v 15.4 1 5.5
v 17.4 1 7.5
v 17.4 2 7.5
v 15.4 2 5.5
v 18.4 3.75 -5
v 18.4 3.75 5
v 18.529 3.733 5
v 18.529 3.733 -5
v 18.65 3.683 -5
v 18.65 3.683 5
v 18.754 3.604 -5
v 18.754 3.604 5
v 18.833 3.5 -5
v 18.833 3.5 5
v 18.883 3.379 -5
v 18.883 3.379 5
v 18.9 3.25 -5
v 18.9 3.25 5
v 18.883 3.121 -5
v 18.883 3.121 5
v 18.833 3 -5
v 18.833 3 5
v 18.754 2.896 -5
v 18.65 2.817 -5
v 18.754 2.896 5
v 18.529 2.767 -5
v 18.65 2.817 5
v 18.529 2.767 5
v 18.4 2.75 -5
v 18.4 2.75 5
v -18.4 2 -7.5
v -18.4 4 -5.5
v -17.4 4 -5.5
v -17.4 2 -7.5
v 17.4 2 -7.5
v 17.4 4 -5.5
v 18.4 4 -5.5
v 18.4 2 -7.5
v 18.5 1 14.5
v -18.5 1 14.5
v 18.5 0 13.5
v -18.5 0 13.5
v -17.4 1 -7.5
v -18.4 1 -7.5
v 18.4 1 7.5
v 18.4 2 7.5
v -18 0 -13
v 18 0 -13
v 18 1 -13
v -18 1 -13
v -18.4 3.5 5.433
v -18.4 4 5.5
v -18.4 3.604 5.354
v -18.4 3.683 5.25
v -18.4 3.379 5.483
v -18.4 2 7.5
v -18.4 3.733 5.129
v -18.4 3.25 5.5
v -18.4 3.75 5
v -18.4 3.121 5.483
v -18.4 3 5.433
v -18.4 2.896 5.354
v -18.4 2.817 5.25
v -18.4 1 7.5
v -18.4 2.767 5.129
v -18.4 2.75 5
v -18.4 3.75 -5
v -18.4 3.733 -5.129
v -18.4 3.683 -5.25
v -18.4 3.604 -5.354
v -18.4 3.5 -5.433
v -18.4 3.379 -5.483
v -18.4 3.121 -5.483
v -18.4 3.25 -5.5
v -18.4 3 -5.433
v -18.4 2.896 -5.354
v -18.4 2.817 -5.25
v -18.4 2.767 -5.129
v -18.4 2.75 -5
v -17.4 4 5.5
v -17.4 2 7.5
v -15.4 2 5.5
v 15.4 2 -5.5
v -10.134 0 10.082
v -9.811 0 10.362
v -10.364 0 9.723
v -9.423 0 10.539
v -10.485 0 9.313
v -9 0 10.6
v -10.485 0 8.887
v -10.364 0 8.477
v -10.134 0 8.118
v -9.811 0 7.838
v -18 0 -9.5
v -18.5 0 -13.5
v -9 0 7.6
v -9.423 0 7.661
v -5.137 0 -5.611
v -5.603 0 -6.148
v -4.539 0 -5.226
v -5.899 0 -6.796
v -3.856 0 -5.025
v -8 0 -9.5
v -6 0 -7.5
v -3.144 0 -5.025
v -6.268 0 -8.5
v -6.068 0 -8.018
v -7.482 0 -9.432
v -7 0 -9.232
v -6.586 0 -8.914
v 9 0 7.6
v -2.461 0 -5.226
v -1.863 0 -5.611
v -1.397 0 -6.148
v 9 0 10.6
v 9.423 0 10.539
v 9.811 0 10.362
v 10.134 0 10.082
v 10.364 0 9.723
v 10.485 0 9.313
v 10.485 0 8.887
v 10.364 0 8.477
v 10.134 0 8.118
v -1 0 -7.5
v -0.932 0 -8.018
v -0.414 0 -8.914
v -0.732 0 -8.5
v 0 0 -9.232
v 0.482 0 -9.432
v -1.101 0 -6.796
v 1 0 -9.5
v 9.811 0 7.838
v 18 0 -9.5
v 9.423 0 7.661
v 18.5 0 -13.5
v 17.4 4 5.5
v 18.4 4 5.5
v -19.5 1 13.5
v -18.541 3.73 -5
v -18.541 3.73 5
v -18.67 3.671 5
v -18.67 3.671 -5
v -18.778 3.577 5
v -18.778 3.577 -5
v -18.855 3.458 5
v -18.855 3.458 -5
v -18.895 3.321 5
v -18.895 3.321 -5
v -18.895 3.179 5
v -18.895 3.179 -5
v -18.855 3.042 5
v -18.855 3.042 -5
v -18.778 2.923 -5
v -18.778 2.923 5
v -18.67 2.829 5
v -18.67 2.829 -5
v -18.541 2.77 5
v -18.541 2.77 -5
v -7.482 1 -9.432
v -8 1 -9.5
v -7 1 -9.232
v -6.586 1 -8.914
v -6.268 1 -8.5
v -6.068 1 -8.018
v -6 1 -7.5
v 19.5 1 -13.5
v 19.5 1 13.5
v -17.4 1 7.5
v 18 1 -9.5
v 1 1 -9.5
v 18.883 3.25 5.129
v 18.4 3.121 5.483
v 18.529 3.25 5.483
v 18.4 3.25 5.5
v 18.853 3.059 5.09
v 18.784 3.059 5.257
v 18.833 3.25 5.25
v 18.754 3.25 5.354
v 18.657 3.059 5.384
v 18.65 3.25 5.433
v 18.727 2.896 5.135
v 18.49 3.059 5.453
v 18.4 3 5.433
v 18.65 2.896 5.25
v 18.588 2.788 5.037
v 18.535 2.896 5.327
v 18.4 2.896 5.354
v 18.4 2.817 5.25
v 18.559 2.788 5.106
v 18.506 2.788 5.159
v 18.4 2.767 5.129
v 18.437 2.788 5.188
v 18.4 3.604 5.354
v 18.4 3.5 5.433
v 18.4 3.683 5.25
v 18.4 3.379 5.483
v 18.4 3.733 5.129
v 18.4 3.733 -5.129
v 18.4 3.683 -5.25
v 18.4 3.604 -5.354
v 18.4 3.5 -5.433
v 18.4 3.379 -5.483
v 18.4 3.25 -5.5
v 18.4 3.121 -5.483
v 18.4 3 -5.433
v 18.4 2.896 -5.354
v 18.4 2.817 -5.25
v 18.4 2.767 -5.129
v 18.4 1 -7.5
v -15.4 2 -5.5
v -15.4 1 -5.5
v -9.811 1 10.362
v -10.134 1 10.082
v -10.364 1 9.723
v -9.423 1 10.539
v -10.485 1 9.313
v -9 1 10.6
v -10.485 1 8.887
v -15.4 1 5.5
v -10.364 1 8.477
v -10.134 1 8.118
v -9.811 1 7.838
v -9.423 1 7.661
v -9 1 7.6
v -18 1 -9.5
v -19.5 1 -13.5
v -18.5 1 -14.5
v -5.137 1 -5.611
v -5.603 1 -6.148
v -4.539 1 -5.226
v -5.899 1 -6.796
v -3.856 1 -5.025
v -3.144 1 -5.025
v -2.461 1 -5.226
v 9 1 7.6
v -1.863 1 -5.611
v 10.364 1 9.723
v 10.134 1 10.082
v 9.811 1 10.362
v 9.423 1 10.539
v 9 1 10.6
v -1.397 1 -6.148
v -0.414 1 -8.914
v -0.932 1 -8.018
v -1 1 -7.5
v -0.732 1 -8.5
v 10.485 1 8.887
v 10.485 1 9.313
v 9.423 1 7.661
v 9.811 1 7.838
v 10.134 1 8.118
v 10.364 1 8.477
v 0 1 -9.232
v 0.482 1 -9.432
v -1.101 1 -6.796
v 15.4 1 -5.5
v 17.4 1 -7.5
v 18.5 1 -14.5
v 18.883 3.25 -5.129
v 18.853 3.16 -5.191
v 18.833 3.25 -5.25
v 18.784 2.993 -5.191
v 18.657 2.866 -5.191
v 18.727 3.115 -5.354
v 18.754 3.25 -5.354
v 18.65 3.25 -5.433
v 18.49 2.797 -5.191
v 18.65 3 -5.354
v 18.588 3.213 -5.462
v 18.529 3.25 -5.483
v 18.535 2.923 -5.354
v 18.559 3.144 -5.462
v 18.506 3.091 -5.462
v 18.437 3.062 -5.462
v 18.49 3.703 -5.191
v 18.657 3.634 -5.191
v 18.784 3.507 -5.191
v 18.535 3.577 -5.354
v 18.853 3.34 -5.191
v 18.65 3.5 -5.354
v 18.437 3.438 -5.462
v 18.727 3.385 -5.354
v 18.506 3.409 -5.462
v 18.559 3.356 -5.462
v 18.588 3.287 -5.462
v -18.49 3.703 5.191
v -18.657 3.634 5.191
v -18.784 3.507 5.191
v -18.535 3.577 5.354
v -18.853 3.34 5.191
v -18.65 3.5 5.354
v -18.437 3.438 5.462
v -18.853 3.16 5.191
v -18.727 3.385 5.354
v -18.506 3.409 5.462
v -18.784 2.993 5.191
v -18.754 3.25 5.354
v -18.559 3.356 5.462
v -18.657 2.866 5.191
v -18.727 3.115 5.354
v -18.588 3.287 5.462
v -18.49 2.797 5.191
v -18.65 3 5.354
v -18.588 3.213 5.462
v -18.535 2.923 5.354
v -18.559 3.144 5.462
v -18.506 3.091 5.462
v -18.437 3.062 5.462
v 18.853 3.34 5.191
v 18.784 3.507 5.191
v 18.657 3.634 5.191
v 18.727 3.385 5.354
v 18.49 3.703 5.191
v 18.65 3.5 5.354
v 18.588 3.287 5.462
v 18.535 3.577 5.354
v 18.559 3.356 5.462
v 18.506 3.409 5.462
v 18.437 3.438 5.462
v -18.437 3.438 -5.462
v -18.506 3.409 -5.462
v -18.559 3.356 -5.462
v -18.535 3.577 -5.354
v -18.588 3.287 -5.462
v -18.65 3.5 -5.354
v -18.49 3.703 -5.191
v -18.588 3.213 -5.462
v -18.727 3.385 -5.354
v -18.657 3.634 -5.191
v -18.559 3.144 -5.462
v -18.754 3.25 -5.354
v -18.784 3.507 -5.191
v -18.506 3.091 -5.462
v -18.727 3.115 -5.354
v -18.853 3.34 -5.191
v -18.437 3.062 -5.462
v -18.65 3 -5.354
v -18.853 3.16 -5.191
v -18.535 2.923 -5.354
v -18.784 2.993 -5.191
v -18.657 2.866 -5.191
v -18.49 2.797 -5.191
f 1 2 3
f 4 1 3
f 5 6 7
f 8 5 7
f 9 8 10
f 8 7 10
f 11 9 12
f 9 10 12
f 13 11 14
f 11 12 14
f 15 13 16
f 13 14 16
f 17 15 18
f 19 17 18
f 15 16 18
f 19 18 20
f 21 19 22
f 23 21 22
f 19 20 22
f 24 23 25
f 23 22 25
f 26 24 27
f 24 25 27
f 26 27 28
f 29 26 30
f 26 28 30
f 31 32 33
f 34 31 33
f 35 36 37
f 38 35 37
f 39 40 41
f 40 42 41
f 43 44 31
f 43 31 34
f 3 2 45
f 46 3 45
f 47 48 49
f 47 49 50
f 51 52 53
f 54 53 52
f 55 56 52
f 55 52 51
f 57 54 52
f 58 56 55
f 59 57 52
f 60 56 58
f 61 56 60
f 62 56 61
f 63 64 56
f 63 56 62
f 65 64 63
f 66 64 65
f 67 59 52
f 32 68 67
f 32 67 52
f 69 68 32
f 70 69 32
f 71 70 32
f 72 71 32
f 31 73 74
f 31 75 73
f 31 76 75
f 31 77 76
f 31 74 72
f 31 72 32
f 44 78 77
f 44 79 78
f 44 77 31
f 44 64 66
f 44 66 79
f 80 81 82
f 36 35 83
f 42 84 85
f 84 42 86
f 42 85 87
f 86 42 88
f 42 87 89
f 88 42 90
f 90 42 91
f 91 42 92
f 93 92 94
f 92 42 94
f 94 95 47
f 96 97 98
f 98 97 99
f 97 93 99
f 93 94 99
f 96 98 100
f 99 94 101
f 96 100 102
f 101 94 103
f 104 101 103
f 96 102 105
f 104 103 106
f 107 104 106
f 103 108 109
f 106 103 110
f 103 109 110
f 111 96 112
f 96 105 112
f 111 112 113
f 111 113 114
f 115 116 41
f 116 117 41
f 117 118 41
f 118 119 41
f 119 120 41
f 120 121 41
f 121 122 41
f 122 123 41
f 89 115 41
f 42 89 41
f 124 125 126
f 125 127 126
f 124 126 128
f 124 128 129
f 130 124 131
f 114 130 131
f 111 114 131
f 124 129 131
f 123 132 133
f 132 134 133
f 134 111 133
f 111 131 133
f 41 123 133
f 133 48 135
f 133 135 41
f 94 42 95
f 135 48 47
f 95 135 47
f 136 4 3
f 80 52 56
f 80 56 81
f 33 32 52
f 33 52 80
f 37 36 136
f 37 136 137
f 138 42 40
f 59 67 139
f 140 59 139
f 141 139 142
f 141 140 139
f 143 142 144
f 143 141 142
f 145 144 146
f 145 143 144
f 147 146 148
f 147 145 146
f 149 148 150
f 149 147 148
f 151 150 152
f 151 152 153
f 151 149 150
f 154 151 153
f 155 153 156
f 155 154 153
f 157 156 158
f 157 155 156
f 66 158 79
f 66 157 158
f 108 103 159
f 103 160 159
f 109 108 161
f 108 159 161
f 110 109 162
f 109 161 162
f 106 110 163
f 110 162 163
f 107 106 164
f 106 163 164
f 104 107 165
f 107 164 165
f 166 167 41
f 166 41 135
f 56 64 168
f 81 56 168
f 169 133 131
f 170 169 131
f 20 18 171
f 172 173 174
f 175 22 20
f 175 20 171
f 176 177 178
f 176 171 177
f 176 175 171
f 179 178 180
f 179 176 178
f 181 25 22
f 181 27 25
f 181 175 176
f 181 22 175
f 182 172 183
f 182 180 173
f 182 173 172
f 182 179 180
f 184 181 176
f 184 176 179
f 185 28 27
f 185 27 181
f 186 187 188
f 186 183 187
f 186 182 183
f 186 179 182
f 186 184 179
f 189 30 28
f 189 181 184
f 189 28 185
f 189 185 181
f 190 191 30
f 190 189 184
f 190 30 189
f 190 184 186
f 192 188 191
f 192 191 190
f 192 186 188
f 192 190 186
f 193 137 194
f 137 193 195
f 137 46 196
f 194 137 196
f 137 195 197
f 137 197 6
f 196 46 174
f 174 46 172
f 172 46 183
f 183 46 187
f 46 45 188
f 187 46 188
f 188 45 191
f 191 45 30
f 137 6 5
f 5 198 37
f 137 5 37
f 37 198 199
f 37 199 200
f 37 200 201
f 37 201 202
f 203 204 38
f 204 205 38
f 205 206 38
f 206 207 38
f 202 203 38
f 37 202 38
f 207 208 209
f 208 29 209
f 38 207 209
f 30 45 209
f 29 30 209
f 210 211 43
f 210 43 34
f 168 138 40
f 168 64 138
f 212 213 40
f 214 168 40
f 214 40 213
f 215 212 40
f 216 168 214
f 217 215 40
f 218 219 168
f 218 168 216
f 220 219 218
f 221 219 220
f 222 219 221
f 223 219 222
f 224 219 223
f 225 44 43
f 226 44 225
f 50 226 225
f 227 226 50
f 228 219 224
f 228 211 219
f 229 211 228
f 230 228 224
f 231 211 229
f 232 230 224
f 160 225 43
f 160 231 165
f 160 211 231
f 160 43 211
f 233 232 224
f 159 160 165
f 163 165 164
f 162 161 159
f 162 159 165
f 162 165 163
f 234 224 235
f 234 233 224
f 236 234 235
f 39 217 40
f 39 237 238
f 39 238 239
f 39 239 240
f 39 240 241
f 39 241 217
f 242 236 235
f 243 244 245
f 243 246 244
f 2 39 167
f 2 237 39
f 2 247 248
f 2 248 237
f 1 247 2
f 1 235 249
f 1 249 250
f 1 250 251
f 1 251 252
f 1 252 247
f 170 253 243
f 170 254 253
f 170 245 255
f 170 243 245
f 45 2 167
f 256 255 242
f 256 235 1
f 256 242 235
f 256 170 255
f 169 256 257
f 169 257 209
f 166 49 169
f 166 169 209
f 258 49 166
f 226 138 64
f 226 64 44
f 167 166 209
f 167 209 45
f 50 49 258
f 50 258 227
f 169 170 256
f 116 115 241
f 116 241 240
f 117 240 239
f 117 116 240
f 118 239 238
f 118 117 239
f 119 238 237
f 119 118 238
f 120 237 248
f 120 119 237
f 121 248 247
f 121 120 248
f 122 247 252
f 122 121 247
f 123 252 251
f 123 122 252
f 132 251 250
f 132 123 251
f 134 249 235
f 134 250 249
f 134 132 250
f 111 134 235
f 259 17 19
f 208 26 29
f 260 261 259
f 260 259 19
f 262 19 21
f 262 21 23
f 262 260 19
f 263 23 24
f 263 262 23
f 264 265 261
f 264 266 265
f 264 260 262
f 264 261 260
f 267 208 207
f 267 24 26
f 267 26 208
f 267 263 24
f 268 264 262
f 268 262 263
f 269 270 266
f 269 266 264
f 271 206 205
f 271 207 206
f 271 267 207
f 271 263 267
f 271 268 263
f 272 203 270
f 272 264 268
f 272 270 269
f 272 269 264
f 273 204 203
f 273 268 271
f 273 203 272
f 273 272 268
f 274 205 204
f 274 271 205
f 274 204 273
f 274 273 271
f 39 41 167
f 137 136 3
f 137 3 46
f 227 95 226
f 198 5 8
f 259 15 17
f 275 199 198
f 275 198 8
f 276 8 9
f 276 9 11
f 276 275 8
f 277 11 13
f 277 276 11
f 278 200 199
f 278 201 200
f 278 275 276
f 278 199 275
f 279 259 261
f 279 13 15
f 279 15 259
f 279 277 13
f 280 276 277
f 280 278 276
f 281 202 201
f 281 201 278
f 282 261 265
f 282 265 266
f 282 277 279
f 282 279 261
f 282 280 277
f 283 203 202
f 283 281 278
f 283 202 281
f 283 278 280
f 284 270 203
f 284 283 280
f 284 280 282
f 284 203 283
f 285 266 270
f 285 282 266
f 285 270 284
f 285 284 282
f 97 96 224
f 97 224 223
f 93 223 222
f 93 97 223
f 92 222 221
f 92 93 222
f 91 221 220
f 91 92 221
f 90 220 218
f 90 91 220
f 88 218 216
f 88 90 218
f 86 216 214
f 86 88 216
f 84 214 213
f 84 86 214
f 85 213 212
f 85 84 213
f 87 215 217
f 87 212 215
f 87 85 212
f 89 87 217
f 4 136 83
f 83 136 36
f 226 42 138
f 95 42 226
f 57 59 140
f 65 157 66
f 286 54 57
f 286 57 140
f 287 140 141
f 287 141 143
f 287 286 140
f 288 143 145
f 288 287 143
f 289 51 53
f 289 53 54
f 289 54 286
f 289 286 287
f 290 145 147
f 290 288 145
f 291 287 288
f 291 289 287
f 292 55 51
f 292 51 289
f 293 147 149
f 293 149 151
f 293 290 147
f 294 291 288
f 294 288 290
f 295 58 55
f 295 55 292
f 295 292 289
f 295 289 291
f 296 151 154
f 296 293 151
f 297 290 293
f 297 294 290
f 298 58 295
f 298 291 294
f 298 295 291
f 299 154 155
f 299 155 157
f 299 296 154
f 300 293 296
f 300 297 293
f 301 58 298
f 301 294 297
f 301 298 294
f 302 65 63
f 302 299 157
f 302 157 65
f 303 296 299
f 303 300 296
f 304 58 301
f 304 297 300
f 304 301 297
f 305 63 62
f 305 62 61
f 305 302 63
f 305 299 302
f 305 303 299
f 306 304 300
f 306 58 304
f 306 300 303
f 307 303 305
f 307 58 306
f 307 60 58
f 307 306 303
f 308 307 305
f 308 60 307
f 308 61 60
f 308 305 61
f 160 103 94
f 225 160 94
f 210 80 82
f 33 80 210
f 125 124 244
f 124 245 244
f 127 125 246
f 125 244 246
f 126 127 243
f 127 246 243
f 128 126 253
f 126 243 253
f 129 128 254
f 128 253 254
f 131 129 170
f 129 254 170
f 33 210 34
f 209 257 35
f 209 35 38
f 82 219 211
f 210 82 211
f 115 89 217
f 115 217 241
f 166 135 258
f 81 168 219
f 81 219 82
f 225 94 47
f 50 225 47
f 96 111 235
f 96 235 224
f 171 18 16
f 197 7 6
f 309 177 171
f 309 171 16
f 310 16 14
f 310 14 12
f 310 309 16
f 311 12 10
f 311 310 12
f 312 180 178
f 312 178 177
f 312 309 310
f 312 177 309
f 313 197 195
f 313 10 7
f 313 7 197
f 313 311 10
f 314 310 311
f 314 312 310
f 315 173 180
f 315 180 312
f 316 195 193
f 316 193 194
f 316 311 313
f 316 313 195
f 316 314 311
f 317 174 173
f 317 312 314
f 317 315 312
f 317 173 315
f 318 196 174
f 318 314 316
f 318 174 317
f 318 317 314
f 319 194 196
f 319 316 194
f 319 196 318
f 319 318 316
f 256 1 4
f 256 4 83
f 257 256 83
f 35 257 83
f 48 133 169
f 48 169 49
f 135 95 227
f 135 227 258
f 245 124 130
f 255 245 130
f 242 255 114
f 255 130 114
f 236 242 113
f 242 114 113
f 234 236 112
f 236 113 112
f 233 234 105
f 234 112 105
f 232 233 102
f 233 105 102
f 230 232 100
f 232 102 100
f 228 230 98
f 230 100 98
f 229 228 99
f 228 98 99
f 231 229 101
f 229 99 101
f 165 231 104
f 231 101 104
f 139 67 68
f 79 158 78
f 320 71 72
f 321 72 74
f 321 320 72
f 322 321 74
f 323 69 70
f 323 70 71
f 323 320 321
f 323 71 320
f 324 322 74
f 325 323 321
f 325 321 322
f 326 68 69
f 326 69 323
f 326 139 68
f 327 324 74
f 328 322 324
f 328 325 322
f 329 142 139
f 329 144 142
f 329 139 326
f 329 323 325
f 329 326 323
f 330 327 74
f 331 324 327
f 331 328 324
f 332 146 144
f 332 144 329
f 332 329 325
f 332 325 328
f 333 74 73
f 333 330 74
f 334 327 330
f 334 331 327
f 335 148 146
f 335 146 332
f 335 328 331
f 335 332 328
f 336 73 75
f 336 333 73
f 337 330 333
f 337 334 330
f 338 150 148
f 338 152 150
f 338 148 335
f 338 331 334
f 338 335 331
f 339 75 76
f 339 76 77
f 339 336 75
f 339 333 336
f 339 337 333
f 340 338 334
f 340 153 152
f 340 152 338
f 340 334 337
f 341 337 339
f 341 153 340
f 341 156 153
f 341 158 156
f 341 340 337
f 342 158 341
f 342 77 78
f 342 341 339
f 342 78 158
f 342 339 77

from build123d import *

# Parameters (mm, degrees)
SKETCH1_W           = 39
SKETCH1_H           = 29
BOSS_EXTRUDE1_DEPTH = 1
SKETCH2_W           = 3
SKETCH2_H           = 15
BOSS_EXTRUDE2_DEPTH = 3
CHAMFER1_SIZE       = 1
CHAMFER2_SIZE       = 2
SKETCH3_W           = 11
SKETCH3_H           = 1
BOSS_EXTRUDE3_DEPTH = 0.5
FILLET1_R           = 0.5
CUT_EXTRUDE1_REACH  = 26.627
CUT_EXTRUDE2_REACH  = 26.627
SKETCH5_W           = 36
SKETCH5_H           = 3.5
CUT_EXTRUDE3_REACH  = 26.627
FILLET2_R           = 2


# Read off the part's stored shape, not the designer's step: Mirror1
# Some blends are built 0.0001 mm under size
with BuildPart() as part:
    # Sketch1 → Boss-Extrude1 (new body)
    with BuildSketch(Plane(origin=(0, 0, 0), x_dir=(1, 0, 0), z_dir=(0, 1, 0))):
        Rectangle(SKETCH1_W, SKETCH1_H)
    extrude(amount=BOSS_EXTRUDE1_DEPTH)

    # Sketch2 → Boss-Extrude2 (add)
    with BuildSketch(Plane(origin=(0, 1, 0), x_dir=(1, 0, 0), z_dir=(0, 1, 0))):
        with Locations((-16.9, 0)):
            Rectangle(SKETCH2_W, SKETCH2_H)
        with Locations((16.9, 0)):
            Rectangle(SKETCH2_W, SKETCH2_H)
    extrude(amount=BOSS_EXTRUDE2_DEPTH)

    # Chamfer1
    chamfer1_edges = [part.edges().sort_by_distance(p)[0] for p in [
        (0, 0, 14.5),
        (-19.5, 0, 0),
        (0, 0, -14.5),
        (19.5, 0, 0),
        (19.5, 0.5, 14.5),
        (-19.5, 0.5, 14.5),
        (-19.5, 0.5, -14.5),
        (19.5, 0.5, -14.5),
    ]]
    chamfer(chamfer1_edges, length=CHAMFER1_SIZE - 0.0001)  # a hair under: the kernel refuses the full size

    # Chamfer2
    chamfer2_edges = [part.edges().sort_by_distance(p)[0] for p in [
        (-15.4, 2.5, 7.5),
        (-15.4, 2.5, -7.5),
        (-16.9, 4, 7.5),
        (-15.4, 4, 0),
        (-16.9, 4, -7.5),
        (15.4, 2.5, -7.5),
        (15.4, 2.5, 7.5),
        (16.9, 4, -7.5),
        (15.4, 4, 0),
        (16.9, 4, 7.5),
    ]]
    chamfer(chamfer2_edges, length=CHAMFER2_SIZE)

    # Sketch3 → Boss-Extrude3 (add)
    with BuildSketch(Plane(origin=(18.4, 0, 0), x_dir=(0, 0, -1), z_dir=(1, 0, 0))):
        with Locations((0, 3.25)):
            Rectangle(SKETCH3_W, SKETCH3_H)
    extrude(amount=BOSS_EXTRUDE3_DEPTH)

    # Fillet1
    # the kernel refuses this fillet: 0.5 mm, written as the material it adds along each edge
    # the kernel refuses this fillet: 0.5 mm, written as the material it takes off along each edge
    with BuildSketch(Plane(origin=(18.4, 3.25, 5), x_dir=(1, 0, 0), z_dir=(0, 0, 1))) as fillet1_2_piece_1_section:
        Polygon((0, 0), (FILLET1_R * 1.02, 0), (FILLET1_R * 1.02, FILLET1_R * 1.02), (0, FILLET1_R * 1.02), align=None)
    fillet1_2_piece_1 = extrude(amount=FILLET1_R * 1.02, mode=Mode.PRIVATE)
    fillet1_2_piece_1 = fillet1_2_piece_1 - Plane(origin=(18.4, 3.25, 5), x_dir=(-0.7071067811865475, -0.7071067811865475, 0), z_dir=(0, 0, 1)) * Sphere(FILLET1_R, mode=Mode.PRIVATE)
    with BuildSketch(Plane(origin=(18.4, 3.25, 5), x_dir=(0, 0, 1), z_dir=(0, -1, 0))) as fillet1_2_piece_2_section:
        Polygon((0, 0), (FILLET1_R * 1.02, 0), (FILLET1_R * 1.02, -FILLET1_R * 1.02), (0, -FILLET1_R * 1.02), align=None)
    fillet1_2_piece_2 = extrude(amount=FILLET1_R * 1.02, mode=Mode.PRIVATE)
    fillet1_2_piece_2 = fillet1_2_piece_2 - Plane(origin=(18.4, 3.25, 5), x_dir=(-0.7071067811865475, 0, -0.7071067811865475), z_dir=(0, -1, 0)) * Sphere(FILLET1_R, mode=Mode.PRIVATE)
    with BuildSketch(Plane(origin=(18.4, 3.25, -5), x_dir=(0, -1, 0), z_dir=(0, 0, -1))) as fillet1_2_piece_3_section:
        Polygon((0, 0), (FILLET1_R * 1.02, 0), (FILLET1_R * 1.02, -FILLET1_R * 1.02), (0, -FILLET1_R * 1.02), align=None)
    fillet1_2_piece_3 = extrude(amount=FILLET1_R * 1.02, mode=Mode.PRIVATE)
    fillet1_2_piece_3 = fillet1_2_piece_3 - Plane(origin=(18.4, 3.25, -5), x_dir=(-0.7071067811865475, 0.7071067811865475, 0), z_dir=(0, 0, -1)) * Sphere(FILLET1_R, mode=Mode.PRIVATE)
    with BuildSketch(Plane(origin=(18.4, 3.25, -5), x_dir=(1, 0, 0), z_dir=(0, 0, -1))) as fillet1_2_piece_4_section:
        Polygon((0, 0), (FILLET1_R * 1.02, 0), (FILLET1_R * 1.02, -FILLET1_R * 1.02), (0, -FILLET1_R * 1.02), align=None)
    fillet1_2_piece_4 = extrude(amount=FILLET1_R * 1.02, mode=Mode.PRIVATE)
    fillet1_2_piece_4 = fillet1_2_piece_4 - Plane(origin=(18.4, 3.25, -5), x_dir=(-0.7071067811865475, -0.7071067811865475, 0), z_dir=(0, 0, -1)) * Sphere(FILLET1_R, mode=Mode.PRIVATE)
    with BuildSketch(Plane(origin=(18.9, 2.75, -5), x_dir=(-1, 0, 0), z_dir=(0, 0, 1)), Plane(origin=(18.9, 3.75, 5), x_dir=(-1, 0, 0), z_dir=(0, 0, -1))) as fillet1_2_piece_5:
        with BuildLine():
            CenterArc((FILLET1_R, -FILLET1_R), FILLET1_R, 90, 90)
            Line((0, -FILLET1_R), (0, 0))
            Line((0, 0), (FILLET1_R, 0))
        make_face()
    fillet1_2_piece_5_solid = extrude(amount=10, mode=Mode.PRIVATE)
    add([fillet1_2_piece_1, fillet1_2_piece_2, fillet1_2_piece_3, fillet1_2_piece_4, fillet1_2_piece_5_solid], mode=Mode.SUBTRACT)

    # Mirror1 outline → Mirror1 (revolve)
    with BuildSketch(Plane(origin=(-18.4, 3.25, 0), x_dir=(1, 0, 0), z_dir=(0, -1, 0))):
        with BuildLine():
            Line((0, 5.5), (0, -5.5))
            ThreePointArc((0, -5.5), (0.353553391, -5.353553391), (0.5, -5))
            Line((0.5, -5), (0.5, 5))
            ThreePointArc((0.5, 5), (0.353553391, 5.353553391), (0, 5.5))
        make_face()
    revolve(axis=Axis((-18.4, 3.25, 0), (0, 0, 1)))

    # Sketch4 → Cut-Extrude1 (cut, up to next)
    with BuildSketch(Plane.XZ, mode=Mode.PRIVATE) as cut_extrude1_sk1:
        with BuildLine():
            Line((9, 7.6), (-9, 7.6))
            ThreePointArc((-9, 7.6), (-10.5, 9.1), (-9, 10.6))
            Line((-9, 10.6), (9, 10.6))
            ThreePointArc((9, 10.6), (10.5, 9.1), (9, 7.6))
        make_face()
    cut_extrude1_tool1 = extrude(cut_extrude1_sk1.sketch, amount=-CUT_EXTRUDE1_REACH, mode=Mode.PRIVATE) & part.part
    add(cut_extrude1_tool1.solids().sort_by_distance((0, 0, 9.1))[0], mode=Mode.SUBTRACT)

    # Sketch5 → Cut-Extrude2 (cut, up to next)
    with BuildSketch(Plane(origin=(0, 0, 0), x_dir=(-1, 0, 0), z_dir=(0, -1, 0)), mode=Mode.PRIVATE) as cut_extrude2_sk1:
        with Locations((0, 11.25)):
            Rectangle(SKETCH5_W, SKETCH5_H)
    cut_extrude2_tool1 = extrude(cut_extrude2_sk1.sketch, amount=-CUT_EXTRUDE2_REACH, mode=Mode.PRIVATE) & part.part
    add(cut_extrude2_tool1.solids().sort_by_distance((0, 0, -11.25))[0], mode=Mode.SUBTRACT)

    # Sketch6 → Cut-Extrude3 (cut, up to next)
    with BuildSketch(Plane.XZ, mode=Mode.PRIVATE) as cut_extrude3_sk1:
        with BuildLine():
            Line((-6, -7.5), (-6, -9.5))
            Line((-6, -9.5), (-1, -9.5))
            Line((-1, -9.5), (-1, -7.5))
            ThreePointArc((-1, -7.5), (-3.5, -5), (-6, -7.5))
        make_face()
    cut_extrude3_tool1 = extrude(cut_extrude3_sk1.sketch, amount=-CUT_EXTRUDE3_REACH, mode=Mode.PRIVATE) & part.part
    add(cut_extrude3_tool1.solids().sort_by_distance((-3.5, 0, -7.478975))[0], mode=Mode.SUBTRACT)

    # Fillet2
    fillet2_edges = [part.edges().sort_by_distance(p)[0] for p in [
        (-6, 0.5, -9.5),
        (-1, 0.5, -9.5),
    ]]
    fillet(fillet2_edges, radius=FILLET2_R - 0.0001)  # a hair under: the kernel refuses the full size


solid = part.part
